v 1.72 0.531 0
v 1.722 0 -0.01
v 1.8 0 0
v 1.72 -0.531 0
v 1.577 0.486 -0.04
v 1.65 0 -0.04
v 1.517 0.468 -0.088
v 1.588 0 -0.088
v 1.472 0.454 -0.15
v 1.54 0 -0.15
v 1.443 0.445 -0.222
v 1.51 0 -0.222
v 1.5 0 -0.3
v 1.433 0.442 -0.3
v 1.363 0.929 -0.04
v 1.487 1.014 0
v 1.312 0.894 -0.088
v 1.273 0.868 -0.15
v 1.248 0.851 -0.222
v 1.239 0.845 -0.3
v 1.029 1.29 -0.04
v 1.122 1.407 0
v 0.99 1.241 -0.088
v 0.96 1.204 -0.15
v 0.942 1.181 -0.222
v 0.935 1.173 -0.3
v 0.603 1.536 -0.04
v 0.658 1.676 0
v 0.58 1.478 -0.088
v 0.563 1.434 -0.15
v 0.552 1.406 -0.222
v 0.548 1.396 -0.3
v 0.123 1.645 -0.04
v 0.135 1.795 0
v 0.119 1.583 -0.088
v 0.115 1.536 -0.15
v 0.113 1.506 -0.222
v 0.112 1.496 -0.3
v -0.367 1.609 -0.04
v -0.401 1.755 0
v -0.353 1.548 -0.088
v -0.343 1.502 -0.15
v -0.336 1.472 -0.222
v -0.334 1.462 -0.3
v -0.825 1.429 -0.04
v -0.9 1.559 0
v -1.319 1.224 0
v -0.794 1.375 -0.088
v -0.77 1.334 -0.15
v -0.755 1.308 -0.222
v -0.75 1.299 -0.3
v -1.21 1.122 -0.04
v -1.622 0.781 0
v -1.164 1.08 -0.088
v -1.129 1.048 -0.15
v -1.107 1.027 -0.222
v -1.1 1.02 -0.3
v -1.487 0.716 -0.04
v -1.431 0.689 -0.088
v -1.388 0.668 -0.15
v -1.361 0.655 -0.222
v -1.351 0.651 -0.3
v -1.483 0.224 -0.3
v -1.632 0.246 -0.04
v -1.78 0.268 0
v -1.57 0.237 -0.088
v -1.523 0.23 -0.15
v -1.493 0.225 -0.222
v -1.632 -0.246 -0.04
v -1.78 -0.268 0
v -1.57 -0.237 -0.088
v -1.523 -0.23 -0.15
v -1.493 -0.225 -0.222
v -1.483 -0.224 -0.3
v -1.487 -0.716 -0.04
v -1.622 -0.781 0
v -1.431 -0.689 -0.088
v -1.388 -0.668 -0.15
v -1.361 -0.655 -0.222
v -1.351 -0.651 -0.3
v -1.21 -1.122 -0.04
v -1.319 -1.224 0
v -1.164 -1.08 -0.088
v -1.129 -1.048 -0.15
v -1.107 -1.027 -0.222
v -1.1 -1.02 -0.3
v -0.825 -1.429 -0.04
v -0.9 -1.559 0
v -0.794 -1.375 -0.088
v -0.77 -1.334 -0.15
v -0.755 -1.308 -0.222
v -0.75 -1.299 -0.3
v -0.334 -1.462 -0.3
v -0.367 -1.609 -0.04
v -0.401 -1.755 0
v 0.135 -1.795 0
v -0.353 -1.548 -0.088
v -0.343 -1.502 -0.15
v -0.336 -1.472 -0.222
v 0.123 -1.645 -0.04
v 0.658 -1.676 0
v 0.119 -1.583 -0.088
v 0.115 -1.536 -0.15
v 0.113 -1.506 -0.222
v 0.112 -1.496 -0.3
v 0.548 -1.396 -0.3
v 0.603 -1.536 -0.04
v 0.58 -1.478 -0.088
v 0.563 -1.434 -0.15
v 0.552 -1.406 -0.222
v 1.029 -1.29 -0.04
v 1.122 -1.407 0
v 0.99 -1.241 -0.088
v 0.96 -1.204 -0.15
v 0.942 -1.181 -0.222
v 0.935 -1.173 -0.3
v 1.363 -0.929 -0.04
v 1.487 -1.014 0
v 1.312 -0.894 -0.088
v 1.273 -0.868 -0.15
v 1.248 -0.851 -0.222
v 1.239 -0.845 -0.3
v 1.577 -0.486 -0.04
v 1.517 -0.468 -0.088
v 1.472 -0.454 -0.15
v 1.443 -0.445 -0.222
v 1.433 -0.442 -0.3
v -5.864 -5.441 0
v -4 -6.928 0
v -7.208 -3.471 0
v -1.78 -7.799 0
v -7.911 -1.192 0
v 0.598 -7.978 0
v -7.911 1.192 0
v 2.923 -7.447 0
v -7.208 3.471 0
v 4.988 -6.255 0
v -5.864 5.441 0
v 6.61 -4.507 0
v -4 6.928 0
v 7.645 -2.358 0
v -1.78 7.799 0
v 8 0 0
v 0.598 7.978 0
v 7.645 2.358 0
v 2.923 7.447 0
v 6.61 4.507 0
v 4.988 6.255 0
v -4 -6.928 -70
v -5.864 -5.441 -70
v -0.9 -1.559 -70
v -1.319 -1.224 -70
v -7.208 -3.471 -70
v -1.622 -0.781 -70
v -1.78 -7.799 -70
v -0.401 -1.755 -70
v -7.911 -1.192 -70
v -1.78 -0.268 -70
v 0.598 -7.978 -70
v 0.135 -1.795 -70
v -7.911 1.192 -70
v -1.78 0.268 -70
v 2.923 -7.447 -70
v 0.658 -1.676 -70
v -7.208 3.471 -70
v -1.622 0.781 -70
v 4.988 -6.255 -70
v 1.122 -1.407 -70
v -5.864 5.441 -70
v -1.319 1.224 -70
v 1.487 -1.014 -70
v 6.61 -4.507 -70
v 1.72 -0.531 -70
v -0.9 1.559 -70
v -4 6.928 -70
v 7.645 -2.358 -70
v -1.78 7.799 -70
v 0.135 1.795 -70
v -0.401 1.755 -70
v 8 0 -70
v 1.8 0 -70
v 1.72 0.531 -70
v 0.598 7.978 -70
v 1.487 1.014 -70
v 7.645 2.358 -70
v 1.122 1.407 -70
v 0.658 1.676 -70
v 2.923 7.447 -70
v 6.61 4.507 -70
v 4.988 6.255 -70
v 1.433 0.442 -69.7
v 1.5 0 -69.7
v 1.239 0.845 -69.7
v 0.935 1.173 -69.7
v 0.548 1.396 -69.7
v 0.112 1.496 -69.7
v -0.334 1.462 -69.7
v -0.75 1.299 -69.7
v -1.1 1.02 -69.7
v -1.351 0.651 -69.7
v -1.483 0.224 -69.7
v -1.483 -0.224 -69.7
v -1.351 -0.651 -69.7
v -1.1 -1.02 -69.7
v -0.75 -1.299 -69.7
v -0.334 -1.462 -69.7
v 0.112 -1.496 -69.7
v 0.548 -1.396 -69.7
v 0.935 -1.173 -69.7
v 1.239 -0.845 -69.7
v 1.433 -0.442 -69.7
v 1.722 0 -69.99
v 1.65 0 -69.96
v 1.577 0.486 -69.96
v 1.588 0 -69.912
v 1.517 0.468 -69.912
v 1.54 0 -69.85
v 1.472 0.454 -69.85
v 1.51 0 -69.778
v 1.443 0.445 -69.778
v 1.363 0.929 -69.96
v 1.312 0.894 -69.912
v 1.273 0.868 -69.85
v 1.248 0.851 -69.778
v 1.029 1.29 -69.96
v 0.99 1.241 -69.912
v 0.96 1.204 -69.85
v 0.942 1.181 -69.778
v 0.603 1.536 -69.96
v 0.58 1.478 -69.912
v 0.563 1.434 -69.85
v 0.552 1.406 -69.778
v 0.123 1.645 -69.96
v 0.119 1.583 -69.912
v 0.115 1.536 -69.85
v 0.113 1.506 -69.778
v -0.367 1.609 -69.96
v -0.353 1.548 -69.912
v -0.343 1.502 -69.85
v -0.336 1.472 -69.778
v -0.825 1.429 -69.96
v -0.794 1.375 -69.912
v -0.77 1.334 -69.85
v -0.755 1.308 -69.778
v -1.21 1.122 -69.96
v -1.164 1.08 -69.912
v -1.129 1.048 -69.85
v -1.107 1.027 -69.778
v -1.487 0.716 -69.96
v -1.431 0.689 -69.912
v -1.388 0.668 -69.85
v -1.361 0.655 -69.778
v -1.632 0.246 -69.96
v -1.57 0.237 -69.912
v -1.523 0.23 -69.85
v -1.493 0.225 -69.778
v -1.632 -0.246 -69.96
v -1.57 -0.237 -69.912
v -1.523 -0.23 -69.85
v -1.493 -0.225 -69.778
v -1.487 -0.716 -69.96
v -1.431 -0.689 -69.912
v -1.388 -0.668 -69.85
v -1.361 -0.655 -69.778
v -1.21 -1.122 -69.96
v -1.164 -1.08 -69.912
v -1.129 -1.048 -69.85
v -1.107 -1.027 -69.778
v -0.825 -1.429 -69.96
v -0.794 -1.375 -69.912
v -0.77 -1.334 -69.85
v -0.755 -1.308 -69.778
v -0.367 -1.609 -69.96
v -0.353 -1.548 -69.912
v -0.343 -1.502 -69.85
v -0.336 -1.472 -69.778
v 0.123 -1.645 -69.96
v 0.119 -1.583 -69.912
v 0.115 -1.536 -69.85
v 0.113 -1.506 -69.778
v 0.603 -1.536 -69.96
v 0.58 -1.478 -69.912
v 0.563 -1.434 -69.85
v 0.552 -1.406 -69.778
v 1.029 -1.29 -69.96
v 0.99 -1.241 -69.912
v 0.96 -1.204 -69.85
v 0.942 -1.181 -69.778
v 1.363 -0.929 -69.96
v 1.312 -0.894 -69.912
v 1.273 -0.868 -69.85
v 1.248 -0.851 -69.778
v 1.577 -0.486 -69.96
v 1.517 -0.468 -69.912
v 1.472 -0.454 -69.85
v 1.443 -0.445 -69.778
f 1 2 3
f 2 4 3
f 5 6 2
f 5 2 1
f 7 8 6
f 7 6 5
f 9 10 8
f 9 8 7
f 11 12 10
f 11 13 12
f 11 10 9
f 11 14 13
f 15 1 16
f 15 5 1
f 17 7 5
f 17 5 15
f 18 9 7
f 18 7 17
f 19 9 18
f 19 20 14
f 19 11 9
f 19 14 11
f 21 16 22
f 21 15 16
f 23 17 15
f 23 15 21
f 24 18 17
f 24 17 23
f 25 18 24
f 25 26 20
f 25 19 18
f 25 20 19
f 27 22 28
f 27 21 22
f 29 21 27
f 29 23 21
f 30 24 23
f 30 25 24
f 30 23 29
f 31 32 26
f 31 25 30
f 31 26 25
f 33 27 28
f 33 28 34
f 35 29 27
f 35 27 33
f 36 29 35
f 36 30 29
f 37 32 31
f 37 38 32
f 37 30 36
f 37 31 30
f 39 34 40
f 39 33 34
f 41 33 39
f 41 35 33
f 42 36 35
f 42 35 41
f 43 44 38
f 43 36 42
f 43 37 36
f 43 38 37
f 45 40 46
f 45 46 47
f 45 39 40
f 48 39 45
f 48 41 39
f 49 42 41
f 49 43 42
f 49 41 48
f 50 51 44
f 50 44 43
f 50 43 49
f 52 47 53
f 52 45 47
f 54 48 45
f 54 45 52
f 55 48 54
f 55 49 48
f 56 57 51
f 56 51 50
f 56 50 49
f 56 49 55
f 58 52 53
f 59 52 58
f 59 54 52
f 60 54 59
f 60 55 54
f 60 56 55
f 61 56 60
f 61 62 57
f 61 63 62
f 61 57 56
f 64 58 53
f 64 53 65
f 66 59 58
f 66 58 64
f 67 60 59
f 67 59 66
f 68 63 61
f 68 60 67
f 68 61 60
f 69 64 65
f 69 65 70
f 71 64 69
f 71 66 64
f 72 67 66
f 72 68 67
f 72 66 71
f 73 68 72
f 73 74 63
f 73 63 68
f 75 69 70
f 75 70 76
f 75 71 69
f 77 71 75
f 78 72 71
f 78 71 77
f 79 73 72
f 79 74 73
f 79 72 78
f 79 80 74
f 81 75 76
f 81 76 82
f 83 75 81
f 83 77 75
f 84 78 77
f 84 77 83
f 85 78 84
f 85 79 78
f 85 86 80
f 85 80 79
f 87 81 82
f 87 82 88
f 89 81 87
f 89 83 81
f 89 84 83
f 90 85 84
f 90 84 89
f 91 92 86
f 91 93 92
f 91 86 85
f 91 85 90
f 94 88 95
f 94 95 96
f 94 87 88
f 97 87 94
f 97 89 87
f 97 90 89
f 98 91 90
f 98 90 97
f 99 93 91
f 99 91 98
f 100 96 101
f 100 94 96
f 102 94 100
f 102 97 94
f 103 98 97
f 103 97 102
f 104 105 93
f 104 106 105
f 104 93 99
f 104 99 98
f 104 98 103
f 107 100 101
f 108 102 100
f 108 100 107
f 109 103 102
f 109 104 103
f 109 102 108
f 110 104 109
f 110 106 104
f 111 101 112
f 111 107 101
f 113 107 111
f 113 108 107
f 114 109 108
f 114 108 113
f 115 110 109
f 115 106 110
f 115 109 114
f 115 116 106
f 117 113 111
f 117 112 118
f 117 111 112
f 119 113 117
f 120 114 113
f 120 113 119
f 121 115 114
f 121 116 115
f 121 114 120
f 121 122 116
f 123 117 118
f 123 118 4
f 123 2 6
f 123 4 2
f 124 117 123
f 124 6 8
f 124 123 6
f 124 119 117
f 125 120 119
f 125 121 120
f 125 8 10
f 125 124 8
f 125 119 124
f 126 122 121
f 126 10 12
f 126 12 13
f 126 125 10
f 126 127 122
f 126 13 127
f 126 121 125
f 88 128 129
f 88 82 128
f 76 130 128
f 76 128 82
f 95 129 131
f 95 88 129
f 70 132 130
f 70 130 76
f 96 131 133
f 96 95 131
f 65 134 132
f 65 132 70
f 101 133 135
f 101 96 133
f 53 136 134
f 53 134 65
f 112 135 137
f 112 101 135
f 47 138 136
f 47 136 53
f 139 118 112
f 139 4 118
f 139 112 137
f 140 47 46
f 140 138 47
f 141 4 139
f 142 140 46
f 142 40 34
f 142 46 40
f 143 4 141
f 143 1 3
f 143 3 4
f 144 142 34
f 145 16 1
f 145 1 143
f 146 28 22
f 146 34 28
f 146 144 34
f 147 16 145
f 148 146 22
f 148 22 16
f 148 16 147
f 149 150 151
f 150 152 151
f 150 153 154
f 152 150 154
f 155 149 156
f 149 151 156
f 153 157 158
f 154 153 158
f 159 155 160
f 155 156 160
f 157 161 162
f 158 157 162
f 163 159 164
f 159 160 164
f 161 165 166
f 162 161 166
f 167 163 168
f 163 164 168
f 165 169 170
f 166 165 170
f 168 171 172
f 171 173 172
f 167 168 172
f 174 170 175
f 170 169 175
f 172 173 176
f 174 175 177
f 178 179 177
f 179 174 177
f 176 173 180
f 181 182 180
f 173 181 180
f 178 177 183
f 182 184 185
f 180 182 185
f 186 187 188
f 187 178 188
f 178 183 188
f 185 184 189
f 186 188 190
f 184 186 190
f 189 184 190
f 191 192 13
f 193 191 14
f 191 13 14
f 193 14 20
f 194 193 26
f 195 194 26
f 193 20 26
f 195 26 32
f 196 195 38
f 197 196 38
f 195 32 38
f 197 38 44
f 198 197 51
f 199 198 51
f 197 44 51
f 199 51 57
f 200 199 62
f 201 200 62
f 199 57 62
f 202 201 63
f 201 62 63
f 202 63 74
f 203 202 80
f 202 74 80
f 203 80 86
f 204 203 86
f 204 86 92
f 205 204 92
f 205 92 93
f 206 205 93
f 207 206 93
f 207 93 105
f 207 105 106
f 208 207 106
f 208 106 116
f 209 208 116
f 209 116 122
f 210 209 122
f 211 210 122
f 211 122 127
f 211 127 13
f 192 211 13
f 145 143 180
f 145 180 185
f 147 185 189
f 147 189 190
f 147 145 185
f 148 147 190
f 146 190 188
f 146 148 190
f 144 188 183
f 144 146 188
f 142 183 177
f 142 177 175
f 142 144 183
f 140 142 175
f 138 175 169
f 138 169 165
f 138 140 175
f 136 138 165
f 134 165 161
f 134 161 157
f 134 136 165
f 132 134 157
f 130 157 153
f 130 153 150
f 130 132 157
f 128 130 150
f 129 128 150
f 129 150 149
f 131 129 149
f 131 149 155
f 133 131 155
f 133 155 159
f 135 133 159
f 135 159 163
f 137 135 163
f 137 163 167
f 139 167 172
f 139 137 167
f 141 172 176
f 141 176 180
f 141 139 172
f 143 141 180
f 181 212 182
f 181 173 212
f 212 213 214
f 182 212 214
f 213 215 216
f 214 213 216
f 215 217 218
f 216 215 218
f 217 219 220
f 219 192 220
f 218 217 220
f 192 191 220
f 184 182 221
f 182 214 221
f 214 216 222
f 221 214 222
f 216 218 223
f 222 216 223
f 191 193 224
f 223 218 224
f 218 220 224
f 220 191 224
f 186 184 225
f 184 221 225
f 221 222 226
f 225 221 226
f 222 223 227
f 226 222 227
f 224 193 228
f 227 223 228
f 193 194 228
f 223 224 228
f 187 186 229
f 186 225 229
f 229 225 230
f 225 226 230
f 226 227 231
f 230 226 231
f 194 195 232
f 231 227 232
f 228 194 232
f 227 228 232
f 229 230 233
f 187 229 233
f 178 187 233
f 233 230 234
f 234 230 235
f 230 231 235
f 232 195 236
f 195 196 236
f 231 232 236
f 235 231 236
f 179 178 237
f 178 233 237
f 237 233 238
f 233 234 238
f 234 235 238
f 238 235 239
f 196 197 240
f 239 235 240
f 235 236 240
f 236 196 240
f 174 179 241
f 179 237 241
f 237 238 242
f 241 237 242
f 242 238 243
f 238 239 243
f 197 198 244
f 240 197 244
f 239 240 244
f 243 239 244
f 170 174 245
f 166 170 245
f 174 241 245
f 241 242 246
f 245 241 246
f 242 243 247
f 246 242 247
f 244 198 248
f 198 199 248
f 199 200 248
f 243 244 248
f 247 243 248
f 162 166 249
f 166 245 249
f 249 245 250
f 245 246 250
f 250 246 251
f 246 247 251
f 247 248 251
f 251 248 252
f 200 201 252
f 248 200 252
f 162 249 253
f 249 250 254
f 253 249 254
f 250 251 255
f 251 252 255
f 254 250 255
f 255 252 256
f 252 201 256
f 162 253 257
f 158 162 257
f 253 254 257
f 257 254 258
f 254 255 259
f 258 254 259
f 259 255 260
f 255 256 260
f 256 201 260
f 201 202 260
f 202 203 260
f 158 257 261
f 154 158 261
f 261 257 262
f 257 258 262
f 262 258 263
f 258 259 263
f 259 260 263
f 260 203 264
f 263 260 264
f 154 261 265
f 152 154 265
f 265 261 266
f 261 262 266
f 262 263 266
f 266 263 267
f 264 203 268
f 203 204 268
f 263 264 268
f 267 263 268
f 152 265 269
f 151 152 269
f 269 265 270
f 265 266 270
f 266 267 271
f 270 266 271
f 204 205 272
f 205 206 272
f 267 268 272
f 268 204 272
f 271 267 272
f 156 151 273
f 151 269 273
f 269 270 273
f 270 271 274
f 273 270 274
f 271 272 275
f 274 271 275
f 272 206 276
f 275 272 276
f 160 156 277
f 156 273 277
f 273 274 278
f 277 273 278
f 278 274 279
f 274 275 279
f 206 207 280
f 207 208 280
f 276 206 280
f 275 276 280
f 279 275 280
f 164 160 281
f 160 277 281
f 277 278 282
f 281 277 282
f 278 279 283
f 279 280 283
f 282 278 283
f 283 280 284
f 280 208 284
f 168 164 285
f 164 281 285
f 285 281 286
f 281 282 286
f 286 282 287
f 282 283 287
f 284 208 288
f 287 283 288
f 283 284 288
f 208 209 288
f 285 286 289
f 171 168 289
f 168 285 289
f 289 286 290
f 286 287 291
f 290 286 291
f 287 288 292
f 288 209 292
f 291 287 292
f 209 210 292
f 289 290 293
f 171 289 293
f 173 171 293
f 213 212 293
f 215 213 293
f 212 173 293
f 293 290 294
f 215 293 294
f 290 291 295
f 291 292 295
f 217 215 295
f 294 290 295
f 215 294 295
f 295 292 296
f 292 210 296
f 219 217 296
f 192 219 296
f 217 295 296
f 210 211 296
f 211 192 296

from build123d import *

# Parameters (mm, degrees)
SKETCH_1_R          = 8
EXTRUDE_1_DEPTH     = 70
SKETCH_6_R          = 1.5
CUT_EXTRUDE_1_DEPTH = 71
FILLET_1_R          = 0.3


with BuildPart() as part:
    # 草图1 → 凸台-拉伸1 (new body)
    with BuildSketch(Plane.XY):
        Circle(SKETCH_1_R)
    extrude(amount=-EXTRUDE_1_DEPTH)

    # 草图6 → 切除-拉伸1 (cut, through all)
    with BuildSketch(Plane.XY):
        Circle(SKETCH_6_R)
    extrude(amount=-CUT_EXTRUDE_1_DEPTH, mode=Mode.SUBTRACT)

    # 圆角1
    fillet_1_edges = [part.edges().sort_by_distance(p)[0] for p in [
        (-1.5, 0, -70),
        (-1.5, 0, 0),
    ]]
    fillet(fillet_1_edges, radius=FILLET_1_R)


solid = part.part
